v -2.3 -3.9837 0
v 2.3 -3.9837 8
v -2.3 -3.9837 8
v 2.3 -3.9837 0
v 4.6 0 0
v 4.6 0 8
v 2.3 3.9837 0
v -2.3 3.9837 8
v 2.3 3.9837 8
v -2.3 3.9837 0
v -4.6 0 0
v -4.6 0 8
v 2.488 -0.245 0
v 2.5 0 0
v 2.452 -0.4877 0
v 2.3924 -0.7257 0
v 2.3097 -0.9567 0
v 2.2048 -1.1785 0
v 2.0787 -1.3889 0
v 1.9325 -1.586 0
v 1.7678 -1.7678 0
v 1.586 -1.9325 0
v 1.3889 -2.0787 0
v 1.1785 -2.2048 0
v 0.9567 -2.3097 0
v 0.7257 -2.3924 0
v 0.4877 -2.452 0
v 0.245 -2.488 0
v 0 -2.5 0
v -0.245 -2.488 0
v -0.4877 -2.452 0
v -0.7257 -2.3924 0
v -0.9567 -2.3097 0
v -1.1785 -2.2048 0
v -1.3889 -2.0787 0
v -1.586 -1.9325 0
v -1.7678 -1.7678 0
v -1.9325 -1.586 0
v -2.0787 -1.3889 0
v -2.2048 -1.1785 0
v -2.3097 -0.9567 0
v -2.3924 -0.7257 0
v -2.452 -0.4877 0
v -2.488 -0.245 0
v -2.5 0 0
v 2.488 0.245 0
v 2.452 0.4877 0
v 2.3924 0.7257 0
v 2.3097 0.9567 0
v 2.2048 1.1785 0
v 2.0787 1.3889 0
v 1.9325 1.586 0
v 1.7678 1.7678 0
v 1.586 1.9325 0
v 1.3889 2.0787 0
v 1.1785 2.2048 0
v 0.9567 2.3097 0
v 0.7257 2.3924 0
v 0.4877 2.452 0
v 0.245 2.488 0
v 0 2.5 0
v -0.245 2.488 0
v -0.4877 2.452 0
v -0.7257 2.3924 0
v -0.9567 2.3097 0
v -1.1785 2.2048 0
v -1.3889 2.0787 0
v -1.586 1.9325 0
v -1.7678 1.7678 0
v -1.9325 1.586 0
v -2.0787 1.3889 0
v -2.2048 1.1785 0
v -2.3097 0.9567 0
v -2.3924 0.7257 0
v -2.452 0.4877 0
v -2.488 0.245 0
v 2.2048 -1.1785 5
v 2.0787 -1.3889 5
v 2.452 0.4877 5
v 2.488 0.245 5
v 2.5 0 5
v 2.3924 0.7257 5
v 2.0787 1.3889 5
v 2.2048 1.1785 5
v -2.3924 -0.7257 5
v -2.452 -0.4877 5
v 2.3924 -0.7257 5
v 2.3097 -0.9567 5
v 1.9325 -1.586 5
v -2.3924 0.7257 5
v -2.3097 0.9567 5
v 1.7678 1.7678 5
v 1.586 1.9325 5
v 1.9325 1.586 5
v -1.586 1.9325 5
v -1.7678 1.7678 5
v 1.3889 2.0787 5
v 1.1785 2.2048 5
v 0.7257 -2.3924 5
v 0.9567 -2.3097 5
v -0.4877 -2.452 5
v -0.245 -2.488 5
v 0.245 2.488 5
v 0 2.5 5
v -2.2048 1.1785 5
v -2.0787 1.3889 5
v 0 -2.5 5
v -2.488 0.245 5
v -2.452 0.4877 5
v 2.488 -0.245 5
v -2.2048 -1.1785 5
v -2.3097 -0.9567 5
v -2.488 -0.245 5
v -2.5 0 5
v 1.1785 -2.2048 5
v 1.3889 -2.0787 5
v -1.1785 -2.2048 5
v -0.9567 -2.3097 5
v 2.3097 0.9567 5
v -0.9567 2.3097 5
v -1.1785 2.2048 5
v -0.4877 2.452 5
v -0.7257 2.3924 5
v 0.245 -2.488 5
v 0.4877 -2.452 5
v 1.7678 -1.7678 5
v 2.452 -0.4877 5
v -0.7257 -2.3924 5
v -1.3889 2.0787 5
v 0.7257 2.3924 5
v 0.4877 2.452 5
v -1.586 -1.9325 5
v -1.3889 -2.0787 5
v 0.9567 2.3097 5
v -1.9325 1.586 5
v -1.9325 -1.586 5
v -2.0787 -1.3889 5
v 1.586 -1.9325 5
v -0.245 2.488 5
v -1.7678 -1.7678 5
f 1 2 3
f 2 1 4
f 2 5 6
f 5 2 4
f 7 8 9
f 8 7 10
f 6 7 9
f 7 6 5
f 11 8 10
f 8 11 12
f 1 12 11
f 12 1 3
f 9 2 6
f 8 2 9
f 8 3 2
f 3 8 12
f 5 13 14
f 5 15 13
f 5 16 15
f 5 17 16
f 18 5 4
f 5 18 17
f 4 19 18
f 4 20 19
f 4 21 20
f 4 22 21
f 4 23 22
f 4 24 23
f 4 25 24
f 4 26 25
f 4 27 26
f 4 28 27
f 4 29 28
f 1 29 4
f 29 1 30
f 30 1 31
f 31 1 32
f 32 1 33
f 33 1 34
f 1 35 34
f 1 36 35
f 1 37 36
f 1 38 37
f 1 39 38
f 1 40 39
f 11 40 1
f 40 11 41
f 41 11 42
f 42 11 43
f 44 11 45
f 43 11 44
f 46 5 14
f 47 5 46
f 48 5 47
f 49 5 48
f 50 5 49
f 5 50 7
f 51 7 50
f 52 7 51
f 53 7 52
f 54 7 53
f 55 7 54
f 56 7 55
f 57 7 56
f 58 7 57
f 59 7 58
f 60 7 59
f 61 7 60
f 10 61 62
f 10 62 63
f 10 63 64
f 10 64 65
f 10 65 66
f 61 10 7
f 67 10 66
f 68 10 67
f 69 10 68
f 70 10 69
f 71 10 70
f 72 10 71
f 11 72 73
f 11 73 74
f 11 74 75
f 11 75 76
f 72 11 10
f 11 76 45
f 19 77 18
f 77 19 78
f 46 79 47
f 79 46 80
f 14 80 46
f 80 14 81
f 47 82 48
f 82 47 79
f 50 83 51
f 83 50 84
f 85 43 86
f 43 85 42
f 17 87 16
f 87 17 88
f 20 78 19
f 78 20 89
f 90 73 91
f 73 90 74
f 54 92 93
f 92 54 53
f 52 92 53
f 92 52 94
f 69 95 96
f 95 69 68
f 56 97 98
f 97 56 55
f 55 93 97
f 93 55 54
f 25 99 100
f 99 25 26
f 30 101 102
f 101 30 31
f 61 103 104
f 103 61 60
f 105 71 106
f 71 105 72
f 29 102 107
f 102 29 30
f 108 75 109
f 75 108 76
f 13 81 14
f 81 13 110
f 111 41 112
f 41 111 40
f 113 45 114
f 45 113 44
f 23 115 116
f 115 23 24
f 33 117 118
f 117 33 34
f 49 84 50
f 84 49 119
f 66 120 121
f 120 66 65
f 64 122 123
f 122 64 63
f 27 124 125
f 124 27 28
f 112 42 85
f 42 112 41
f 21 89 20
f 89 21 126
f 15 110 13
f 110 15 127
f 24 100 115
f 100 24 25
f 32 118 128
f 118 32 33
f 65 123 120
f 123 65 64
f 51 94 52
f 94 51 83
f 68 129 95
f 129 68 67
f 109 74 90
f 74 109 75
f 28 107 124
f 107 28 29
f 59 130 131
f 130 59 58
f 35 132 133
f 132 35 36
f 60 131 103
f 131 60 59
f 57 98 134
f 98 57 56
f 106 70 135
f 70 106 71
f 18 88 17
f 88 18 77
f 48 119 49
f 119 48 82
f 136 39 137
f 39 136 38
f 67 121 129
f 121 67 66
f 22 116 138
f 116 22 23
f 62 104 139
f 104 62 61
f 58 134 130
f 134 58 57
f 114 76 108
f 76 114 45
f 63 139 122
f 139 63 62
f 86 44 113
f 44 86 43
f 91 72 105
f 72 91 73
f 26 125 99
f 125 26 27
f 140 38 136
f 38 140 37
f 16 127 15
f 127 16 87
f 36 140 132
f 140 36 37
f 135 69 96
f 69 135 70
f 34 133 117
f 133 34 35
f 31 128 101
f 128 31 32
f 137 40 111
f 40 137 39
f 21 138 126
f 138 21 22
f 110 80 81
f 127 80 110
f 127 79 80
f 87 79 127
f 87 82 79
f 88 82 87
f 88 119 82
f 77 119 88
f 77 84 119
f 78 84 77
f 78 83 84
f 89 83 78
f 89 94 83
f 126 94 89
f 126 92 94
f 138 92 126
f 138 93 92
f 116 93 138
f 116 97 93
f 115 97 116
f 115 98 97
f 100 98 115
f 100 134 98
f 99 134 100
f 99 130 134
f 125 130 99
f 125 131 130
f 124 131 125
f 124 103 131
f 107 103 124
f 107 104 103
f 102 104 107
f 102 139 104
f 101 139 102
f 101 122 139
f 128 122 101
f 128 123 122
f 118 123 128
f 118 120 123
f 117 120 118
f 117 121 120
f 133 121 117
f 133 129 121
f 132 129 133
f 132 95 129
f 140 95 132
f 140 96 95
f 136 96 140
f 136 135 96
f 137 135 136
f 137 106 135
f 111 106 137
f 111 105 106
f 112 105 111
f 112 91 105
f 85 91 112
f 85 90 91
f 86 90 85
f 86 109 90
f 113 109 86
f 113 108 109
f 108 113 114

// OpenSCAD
module hex_nut() {
    difference() {
        // Hexagonal prism for the nut
        scale([9.2/2, 9.2/2, 4.0/2])
            cylinder(h=4.0, r=1, $fn=6);
        
        // Cylindrical hole for the screw
        translate([0, 0, -1])
            cylinder(h=6.0, r=2.5, $fn=64);
    }
}

hex_nut();
